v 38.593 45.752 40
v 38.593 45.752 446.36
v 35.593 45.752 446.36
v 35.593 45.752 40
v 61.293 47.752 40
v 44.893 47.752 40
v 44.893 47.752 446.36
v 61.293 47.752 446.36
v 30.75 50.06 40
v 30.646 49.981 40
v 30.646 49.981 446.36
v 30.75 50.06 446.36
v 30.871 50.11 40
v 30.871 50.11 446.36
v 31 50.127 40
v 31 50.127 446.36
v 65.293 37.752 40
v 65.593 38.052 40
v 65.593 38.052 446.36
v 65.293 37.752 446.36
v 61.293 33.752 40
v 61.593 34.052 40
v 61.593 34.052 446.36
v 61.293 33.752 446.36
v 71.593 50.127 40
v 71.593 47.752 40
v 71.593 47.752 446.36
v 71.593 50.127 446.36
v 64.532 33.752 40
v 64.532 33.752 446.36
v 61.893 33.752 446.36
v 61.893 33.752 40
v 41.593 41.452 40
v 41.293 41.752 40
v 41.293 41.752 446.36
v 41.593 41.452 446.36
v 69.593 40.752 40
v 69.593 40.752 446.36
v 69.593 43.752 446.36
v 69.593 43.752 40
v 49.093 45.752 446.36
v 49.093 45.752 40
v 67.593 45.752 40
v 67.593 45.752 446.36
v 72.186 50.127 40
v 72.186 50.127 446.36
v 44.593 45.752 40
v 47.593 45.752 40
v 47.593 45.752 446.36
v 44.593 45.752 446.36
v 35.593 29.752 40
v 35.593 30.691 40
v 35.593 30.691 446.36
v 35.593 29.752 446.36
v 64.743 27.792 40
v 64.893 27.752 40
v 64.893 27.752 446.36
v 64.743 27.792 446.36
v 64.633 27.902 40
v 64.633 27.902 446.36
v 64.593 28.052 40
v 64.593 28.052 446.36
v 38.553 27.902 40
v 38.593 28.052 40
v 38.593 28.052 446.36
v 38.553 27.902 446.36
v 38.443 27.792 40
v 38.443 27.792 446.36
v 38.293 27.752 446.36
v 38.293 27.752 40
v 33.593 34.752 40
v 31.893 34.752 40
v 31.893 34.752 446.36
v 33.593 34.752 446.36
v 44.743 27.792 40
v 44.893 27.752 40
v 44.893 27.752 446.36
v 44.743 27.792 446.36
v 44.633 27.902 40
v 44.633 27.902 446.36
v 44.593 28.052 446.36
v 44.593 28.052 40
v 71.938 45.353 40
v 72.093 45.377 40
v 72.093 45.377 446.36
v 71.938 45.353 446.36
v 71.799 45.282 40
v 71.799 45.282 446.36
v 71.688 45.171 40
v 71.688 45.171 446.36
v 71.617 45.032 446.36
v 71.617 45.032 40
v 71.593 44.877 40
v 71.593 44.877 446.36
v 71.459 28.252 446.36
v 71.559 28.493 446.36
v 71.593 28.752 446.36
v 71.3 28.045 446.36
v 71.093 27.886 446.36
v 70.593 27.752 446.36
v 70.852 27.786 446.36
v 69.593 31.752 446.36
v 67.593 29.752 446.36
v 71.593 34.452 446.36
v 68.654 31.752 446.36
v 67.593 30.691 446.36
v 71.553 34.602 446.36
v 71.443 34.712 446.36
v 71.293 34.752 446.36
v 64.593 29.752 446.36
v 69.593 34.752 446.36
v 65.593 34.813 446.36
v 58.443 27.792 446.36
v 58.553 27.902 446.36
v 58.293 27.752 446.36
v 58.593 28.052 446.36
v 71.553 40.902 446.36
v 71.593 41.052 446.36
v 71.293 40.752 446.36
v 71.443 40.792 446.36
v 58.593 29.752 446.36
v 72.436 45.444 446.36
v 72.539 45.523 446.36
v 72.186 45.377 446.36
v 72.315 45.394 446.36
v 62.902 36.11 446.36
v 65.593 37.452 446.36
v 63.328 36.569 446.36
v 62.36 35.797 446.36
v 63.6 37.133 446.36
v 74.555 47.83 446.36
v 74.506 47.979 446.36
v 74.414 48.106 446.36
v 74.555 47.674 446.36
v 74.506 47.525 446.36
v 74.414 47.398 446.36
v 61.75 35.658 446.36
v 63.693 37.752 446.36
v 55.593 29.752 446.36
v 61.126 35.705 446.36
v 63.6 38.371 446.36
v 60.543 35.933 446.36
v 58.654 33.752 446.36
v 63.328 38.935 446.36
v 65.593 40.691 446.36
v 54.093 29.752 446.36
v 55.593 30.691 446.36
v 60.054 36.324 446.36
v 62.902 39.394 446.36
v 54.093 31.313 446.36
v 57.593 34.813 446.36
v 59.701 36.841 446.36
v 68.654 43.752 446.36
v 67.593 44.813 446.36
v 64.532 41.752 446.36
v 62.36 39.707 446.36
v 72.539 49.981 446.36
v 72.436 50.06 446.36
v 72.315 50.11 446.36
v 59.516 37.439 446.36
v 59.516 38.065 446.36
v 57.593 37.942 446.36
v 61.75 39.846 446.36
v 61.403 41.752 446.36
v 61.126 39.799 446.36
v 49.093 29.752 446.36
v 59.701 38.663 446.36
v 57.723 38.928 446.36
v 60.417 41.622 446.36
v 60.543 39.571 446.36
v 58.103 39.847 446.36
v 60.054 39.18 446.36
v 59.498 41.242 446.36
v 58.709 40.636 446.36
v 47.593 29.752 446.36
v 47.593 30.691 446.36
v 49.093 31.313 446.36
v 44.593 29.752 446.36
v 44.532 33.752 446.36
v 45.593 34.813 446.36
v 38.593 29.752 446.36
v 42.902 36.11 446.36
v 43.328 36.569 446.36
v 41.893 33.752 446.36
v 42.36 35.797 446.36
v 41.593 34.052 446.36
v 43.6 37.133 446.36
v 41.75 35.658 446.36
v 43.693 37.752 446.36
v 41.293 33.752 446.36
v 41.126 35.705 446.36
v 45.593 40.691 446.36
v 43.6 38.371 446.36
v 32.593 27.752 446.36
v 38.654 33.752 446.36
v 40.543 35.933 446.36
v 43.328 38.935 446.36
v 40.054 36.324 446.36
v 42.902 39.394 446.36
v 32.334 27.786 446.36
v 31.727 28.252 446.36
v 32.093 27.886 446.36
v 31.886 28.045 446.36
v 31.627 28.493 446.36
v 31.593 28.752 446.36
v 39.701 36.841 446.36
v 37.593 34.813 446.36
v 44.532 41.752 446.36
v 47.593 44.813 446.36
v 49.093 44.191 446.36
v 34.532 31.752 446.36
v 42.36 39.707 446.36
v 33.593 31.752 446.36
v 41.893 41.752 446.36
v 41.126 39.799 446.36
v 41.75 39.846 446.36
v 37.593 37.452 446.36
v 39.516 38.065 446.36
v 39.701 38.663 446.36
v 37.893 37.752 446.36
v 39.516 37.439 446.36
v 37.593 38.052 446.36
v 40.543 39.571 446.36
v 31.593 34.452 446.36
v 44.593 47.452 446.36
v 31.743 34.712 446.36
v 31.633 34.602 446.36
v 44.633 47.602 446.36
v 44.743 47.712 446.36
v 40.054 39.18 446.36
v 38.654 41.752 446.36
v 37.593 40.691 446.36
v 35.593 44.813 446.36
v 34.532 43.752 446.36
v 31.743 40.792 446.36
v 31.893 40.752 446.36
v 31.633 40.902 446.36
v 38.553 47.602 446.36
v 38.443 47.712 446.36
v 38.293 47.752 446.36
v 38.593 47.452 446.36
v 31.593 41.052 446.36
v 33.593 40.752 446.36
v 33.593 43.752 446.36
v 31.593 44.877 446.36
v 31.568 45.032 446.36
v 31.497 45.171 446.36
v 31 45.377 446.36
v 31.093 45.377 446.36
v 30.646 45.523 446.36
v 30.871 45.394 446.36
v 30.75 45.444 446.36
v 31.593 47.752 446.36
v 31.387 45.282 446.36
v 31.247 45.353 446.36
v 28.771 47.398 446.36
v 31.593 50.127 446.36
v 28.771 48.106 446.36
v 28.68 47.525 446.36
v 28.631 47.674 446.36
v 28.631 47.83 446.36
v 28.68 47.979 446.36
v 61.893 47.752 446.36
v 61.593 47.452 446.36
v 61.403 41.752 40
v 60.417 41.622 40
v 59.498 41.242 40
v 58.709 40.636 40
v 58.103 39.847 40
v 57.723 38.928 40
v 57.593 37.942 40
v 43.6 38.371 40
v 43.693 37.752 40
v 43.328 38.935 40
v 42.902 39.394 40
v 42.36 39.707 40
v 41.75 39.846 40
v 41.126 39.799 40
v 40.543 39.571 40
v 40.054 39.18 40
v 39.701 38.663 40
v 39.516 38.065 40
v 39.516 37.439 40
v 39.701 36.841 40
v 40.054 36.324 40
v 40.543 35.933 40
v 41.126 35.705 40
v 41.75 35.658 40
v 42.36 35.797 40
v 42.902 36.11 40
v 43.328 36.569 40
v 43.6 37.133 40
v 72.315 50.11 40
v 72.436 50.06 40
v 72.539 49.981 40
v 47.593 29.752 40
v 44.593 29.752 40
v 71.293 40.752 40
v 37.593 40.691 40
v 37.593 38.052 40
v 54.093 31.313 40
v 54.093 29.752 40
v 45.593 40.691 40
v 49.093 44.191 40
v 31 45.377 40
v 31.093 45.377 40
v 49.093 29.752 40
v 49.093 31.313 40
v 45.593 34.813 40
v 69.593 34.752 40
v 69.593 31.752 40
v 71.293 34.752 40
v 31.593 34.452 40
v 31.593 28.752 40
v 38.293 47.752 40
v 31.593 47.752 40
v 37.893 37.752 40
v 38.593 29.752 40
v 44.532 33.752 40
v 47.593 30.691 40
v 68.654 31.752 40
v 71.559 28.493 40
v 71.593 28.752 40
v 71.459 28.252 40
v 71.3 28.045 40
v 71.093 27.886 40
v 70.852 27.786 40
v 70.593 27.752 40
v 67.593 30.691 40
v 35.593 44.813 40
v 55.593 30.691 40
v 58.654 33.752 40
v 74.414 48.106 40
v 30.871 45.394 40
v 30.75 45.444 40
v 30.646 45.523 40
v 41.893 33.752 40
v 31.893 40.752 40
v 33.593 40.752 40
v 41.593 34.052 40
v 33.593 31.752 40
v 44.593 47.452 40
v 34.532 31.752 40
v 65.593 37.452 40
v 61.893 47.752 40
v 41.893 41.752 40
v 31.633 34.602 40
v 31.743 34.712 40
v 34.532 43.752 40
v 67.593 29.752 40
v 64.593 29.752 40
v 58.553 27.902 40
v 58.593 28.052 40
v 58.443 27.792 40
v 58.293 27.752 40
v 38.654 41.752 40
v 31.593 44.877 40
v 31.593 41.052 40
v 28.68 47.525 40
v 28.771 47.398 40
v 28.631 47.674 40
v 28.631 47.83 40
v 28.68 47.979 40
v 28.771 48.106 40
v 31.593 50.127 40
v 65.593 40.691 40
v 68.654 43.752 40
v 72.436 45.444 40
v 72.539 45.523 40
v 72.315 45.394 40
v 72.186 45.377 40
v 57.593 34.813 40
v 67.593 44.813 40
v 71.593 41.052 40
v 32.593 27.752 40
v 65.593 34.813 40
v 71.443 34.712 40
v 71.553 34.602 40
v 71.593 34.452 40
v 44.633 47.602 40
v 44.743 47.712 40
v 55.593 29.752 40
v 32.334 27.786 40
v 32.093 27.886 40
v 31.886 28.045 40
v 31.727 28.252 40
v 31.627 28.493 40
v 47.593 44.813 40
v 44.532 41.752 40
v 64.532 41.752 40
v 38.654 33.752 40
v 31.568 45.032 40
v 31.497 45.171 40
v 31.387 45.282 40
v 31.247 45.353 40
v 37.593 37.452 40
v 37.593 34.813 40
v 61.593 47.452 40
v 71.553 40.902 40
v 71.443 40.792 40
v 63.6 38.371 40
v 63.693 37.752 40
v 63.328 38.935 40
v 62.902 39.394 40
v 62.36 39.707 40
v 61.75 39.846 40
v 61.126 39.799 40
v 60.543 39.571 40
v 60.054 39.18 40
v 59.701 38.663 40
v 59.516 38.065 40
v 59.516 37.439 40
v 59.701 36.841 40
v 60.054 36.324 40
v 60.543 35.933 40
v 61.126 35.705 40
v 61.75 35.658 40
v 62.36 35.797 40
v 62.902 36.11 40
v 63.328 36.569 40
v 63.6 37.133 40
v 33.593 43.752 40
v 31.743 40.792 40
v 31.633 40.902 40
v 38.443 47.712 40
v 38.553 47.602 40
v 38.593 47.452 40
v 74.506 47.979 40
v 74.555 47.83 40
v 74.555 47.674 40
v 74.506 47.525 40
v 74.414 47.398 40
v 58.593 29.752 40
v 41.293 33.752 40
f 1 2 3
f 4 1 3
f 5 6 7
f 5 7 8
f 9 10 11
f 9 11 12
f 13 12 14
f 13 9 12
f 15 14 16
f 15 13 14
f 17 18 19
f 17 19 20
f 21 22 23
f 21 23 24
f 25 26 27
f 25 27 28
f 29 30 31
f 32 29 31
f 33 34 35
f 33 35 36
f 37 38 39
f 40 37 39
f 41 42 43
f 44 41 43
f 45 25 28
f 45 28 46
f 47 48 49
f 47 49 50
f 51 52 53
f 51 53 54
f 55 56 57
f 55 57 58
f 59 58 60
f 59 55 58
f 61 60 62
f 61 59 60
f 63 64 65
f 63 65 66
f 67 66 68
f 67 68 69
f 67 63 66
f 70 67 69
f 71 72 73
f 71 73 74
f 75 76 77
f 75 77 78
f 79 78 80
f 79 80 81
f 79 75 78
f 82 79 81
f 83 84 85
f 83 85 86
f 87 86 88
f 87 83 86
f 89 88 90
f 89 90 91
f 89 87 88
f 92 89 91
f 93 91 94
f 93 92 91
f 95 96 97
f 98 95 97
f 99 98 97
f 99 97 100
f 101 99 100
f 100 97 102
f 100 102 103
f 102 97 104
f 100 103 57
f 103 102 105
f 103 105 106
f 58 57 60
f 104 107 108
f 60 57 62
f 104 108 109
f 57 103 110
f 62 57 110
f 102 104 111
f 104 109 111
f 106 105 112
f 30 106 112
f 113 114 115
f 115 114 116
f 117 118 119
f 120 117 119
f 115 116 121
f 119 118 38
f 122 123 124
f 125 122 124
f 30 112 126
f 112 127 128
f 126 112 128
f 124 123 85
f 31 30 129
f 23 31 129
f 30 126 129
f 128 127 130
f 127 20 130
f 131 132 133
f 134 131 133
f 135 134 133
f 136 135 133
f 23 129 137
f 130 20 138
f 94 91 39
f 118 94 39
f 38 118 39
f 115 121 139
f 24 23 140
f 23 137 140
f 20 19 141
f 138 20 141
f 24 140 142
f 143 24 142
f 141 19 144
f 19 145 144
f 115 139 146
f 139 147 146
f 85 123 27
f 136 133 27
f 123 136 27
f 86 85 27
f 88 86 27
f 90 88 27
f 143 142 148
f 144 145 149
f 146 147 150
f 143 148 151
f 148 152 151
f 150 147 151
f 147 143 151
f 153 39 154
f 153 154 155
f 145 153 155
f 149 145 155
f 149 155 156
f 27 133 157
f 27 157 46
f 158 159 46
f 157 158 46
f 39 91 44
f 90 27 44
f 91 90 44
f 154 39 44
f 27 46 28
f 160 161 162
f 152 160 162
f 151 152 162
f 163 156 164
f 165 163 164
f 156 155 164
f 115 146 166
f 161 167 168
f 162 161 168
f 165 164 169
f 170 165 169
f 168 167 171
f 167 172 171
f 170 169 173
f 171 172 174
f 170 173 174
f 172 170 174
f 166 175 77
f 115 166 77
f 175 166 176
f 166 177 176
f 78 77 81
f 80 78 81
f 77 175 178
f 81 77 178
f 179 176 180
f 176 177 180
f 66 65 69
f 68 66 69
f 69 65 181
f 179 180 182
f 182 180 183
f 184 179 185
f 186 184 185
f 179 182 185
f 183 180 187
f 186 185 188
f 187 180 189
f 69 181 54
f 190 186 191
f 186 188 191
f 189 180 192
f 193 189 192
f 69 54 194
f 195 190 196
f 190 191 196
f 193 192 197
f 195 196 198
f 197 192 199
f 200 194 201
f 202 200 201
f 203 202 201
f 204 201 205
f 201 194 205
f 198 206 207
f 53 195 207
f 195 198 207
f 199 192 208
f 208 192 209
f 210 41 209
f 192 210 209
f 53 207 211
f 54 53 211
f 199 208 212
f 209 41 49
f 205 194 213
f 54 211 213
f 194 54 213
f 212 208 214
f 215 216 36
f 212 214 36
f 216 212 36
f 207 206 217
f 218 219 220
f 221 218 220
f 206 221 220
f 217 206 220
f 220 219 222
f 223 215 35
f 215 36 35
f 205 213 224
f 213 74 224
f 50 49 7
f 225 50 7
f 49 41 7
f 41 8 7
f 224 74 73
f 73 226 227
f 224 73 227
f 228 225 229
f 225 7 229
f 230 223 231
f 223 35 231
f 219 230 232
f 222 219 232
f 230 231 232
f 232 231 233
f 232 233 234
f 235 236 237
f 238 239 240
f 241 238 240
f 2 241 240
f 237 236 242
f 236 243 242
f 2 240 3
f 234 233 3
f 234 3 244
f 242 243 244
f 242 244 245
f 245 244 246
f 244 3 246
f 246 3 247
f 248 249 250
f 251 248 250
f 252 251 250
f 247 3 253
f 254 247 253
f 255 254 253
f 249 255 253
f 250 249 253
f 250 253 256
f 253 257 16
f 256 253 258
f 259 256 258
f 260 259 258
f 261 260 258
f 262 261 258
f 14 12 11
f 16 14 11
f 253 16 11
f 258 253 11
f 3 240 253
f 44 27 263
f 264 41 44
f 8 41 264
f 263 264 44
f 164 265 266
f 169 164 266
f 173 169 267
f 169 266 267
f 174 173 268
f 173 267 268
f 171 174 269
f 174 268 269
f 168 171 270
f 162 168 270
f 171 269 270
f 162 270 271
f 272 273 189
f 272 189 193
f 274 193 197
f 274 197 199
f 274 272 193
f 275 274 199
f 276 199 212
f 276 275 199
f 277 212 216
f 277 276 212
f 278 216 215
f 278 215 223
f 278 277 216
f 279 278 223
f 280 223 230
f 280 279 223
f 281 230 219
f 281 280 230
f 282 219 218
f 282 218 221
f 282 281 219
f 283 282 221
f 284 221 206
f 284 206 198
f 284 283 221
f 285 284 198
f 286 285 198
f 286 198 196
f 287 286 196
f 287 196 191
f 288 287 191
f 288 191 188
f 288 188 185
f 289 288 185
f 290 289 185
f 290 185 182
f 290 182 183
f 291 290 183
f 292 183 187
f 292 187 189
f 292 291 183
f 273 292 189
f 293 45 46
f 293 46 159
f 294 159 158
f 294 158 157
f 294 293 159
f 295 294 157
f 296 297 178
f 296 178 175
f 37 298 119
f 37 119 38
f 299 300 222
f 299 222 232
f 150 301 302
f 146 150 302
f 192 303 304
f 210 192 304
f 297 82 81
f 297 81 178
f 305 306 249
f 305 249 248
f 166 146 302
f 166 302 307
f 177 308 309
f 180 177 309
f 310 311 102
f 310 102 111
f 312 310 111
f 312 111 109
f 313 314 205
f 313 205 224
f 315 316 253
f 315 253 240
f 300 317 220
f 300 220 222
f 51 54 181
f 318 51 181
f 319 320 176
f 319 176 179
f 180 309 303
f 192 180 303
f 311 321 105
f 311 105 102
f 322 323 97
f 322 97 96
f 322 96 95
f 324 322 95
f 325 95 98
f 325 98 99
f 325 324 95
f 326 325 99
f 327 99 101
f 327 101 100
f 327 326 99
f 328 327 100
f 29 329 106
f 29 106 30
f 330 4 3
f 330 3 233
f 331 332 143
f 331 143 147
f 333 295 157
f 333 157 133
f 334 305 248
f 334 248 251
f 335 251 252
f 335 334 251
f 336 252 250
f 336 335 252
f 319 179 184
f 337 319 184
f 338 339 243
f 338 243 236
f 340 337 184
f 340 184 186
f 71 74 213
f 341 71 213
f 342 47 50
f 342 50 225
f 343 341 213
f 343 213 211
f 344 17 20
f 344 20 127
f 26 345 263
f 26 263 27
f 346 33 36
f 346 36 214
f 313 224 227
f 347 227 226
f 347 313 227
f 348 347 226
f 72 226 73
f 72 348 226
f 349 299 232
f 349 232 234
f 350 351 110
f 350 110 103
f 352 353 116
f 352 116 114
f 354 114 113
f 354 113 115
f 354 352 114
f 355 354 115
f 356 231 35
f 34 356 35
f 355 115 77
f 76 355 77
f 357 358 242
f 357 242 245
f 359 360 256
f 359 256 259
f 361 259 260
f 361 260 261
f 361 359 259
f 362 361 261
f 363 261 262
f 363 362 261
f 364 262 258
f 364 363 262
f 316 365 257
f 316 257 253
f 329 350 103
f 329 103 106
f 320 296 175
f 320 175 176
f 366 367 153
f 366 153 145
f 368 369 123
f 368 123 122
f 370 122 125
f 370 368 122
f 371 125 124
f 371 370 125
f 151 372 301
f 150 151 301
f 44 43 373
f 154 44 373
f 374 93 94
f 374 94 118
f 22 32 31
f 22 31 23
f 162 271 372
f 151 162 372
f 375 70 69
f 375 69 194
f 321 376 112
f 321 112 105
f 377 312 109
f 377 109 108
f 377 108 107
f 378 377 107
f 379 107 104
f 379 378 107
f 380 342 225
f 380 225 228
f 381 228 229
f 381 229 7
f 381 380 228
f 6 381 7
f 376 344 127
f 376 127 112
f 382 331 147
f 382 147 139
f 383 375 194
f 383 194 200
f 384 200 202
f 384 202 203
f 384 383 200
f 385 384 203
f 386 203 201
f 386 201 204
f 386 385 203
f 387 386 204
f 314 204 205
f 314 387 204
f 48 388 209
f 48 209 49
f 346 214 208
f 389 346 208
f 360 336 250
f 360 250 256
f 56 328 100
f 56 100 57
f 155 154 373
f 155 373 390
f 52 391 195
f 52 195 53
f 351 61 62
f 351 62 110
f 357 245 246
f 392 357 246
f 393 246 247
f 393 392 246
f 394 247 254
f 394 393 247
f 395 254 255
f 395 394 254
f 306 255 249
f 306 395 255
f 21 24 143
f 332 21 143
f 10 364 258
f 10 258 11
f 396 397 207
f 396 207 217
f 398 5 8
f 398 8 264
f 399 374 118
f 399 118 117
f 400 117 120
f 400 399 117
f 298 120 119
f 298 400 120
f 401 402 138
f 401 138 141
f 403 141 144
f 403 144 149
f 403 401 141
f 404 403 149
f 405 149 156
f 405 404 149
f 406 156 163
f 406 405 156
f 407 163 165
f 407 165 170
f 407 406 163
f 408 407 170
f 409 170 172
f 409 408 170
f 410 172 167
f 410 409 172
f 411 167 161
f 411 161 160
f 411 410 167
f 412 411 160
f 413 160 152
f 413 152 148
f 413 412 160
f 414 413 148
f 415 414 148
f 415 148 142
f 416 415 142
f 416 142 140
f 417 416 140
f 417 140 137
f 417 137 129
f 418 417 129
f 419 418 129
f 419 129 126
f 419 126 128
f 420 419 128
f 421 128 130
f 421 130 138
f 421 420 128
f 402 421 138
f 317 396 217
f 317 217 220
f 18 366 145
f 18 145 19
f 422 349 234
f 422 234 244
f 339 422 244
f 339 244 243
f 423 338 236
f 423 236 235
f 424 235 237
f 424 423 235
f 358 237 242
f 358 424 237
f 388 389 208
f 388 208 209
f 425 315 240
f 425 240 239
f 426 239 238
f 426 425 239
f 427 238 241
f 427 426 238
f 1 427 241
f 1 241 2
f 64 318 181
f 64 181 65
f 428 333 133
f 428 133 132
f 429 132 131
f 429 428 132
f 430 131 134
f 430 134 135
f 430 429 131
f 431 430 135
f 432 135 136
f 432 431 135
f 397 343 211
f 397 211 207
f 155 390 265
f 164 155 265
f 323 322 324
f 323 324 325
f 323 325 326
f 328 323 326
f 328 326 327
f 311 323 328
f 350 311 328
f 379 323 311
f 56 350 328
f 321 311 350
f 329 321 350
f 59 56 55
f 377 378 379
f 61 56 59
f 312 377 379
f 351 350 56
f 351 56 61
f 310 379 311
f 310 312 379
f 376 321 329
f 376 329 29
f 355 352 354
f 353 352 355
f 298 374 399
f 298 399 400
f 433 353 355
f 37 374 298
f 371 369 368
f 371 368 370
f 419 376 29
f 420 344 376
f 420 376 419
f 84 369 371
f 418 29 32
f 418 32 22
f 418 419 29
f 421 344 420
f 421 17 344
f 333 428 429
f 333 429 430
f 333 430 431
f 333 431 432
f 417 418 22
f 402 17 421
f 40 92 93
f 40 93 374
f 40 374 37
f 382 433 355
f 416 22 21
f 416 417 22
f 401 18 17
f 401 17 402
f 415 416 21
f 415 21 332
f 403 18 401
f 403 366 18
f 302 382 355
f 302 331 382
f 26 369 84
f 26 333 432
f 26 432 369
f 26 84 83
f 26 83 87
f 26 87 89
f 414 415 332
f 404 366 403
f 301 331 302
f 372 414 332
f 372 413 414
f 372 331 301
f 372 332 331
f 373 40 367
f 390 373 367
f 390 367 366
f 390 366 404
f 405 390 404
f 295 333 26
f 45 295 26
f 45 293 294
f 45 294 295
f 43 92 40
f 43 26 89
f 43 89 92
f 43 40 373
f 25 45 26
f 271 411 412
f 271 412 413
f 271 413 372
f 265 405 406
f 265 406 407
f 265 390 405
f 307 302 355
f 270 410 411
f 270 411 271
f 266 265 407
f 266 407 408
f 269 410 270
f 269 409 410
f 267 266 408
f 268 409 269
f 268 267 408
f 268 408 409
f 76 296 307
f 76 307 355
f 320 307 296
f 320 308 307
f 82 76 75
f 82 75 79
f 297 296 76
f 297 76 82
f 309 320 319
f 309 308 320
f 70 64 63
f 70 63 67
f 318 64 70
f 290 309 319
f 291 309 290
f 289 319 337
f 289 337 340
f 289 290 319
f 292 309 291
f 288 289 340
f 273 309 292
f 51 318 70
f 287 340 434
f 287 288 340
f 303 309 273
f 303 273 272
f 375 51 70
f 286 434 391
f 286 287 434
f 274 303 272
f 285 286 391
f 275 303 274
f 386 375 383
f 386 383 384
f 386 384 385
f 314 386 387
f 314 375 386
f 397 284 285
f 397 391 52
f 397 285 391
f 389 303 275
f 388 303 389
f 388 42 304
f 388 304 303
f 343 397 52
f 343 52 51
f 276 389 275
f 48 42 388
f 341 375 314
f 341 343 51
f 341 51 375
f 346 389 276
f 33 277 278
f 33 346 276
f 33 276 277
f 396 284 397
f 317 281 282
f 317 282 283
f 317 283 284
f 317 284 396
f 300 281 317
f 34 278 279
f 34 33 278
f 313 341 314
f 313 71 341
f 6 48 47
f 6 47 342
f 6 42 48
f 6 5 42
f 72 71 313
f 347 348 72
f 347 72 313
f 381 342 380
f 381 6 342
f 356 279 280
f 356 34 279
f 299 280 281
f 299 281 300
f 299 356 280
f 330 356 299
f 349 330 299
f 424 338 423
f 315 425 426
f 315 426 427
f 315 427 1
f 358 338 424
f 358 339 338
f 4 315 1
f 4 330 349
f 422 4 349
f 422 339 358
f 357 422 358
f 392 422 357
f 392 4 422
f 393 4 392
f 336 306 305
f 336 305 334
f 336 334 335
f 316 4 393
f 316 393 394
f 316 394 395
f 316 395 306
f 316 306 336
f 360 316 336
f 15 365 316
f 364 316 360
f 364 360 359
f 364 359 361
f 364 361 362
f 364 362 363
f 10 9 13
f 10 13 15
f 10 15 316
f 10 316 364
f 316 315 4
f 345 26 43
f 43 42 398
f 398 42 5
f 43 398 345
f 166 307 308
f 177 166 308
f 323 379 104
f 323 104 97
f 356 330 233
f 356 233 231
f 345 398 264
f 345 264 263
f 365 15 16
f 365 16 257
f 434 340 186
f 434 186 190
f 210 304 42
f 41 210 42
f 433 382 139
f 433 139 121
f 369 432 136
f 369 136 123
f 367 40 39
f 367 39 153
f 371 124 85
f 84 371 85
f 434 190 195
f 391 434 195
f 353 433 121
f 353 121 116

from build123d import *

# Parameters (mm, degrees)
BOSS_EXTRUDE1_START = 40
MODEL_R             = 2.100000001
BOSS_EXTRUDE1_DEPTH = 406.36


with BuildPart() as part:
    # Model → Boss-Extrude1 (new body)
    with BuildSketch(Plane.XY.offset(BOSS_EXTRUDE1_START)):
        with BuildLine():
            Line((28.771485975, 48.105572105), (30.646485975, 49.980572105))
            ThreePointArc((30.646485975, 49.980572105), (30.808697649, 50.08895848), (31.000039365, 50.127018713))
            Line((31.000039365, 50.127018713), (31.592932584, 50.127018713))
            Line((31.592932584, 50.127018713), (31.592932584, 47.752018713))
            Line((31.592932584, 47.752018713), (38.292932585, 47.752018713))
            ThreePointArc((38.292932585, 47.752018713), (38.505064619, 47.664150748), (38.592932584, 47.452018714))
            Line((38.592932584, 47.452018714), (38.592932584, 45.752018713))
            Line((38.592932584, 45.752018713), (35.592932585, 45.752018713))
            Line((35.592932585, 45.752018713), (35.592932585, 44.812678885))
            Line((35.592932585, 44.812678885), (38.653592756, 41.752018713))
            Line((38.653592756, 41.752018713), (41.292932583, 41.752018713))
            Line((41.292932583, 41.752018713), (41.592932584, 41.452018713))
            Line((41.592932584, 41.452018713), (41.892932586, 41.752018714))
            Line((41.892932586, 41.752018714), (44.532272412, 41.752018714))
            Line((44.532272412, 41.752018714), (47.592932584, 44.812678886))
            Line((47.592932584, 44.812678886), (47.592932584, 45.752018714))
            Line((47.592932584, 45.752018714), (44.592932584, 45.752018714))
            Line((44.592932584, 45.752018714), (44.592932584, 47.452018715))
            ThreePointArc((44.592932584, 47.452018715), (44.68080055, 47.664150749), (44.892932584, 47.752018715))
            Line((44.892932584, 47.752018715), (61.292932583, 47.752018715))
            Line((61.292932583, 47.752018715), (61.592932582, 47.452018715))
            Line((61.592932582, 47.452018715), (61.892932583, 47.752018716))
            Line((61.892932583, 47.752018716), (71.592932583, 47.752018716))
            Line((71.592932583, 47.752018716), (71.592932583, 50.127018711))
            Line((71.592932583, 50.127018711), (72.185825802, 50.127018711))
            ThreePointArc((72.185825802, 50.127018711), (72.377167518, 50.088958477), (72.539379192, 49.980572102))
            Line((72.539379192, 49.980572102), (74.414379192, 48.105572102))
            ThreePointArc((74.414379192, 48.105572102), (74.560825801, 47.752018712), (74.414379192, 47.398465322))
            Line((74.414379192, 47.398465322), (72.539379192, 45.523465322))
            ThreePointArc((72.539379192, 45.523465322), (72.377167518, 45.415078947), (72.185825802, 45.377018714))
            Line((72.185825802, 45.377018714), (72.092932582, 45.377018714))
            ThreePointArc((72.092932582, 45.377018714), (71.739379192, 45.230572103), (71.592932583, 44.877018713))
            Line((71.592932583, 44.877018713), (71.592932583, 41.052018712))
            ThreePointArc((71.592932583, 41.052018712), (71.505064617, 40.839886678), (71.292932581, 40.752018713))
            Line((71.292932581, 40.752018713), (69.592932583, 40.752018713))
            Line((69.592932583, 40.752018713), (69.592932583, 43.752018712))
            Line((69.592932583, 43.752018712), (68.653592755, 43.752018712))
            Line((68.653592755, 43.752018712), (65.592932583, 40.691358541))
            Line((65.592932583, 40.691358541), (65.592932583, 38.052018712))
            Line((65.592932583, 38.052018712), (65.292932584, 37.752018712))
            Line((65.292932584, 37.752018712), (65.592932583, 37.452018713))
            Line((65.592932583, 37.452018713), (65.592932583, 34.812678884))
            Line((65.592932583, 34.812678884), (68.653592755, 31.752018712))
            Line((68.653592755, 31.752018712), (69.592932583, 31.752018712))
            Line((69.592932583, 31.752018712), (69.592932583, 34.752018711))
            Line((69.592932583, 34.752018711), (71.292932581, 34.752018711))
            ThreePointArc((71.292932581, 34.752018711), (71.505064617, 34.664150747), (71.592932583, 34.452018712))
            Line((71.592932583, 34.452018712), (71.592932583, 28.75201871))
            ThreePointArc((71.592932583, 28.75201871), (71.300039364, 28.044911929), (70.592932582, 27.752018711))
            Line((70.592932582, 27.752018711), (64.892932582, 27.752018711))
            ThreePointArc((64.892932582, 27.752018711), (64.680800548, 27.839886676), (64.592932583, 28.05201871))
            Line((64.592932583, 28.05201871), (64.592932583, 29.752018711))
            Line((64.592932583, 29.752018711), (67.592932582, 29.752018711))
            Line((67.592932582, 29.752018711), (67.592932582, 30.69135854))
            Line((67.592932582, 30.69135854), (64.532272411, 33.752018711))
            Line((64.532272411, 33.752018711), (61.892932584, 33.752018711))
            Line((61.892932584, 33.752018711), (61.592932582, 34.052018713))
            Line((61.592932582, 34.052018713), (61.292932582, 33.752018712))
            Line((61.292932582, 33.752018712), (58.653592755, 33.752018712))
            Line((58.653592755, 33.752018712), (55.592932583, 30.691358541))
            Line((55.592932583, 30.691358541), (55.592932583, 29.752018713))
            Line((55.592932583, 29.752018713), (58.592932583, 29.752018713))
            Line((58.592932583, 29.752018713), (58.592932583, 28.052018712))
            ThreePointArc((58.592932583, 28.052018712), (58.505064617, 27.839886678), (58.292932583, 27.752018712))
            Line((58.292932583, 27.752018712), (44.892932584, 27.752018712))
            ThreePointArc((44.892932584, 27.752018712), (44.68080055, 27.839886678), (44.592932584, 28.052018712))
            Line((44.592932584, 28.052018712), (44.592932584, 29.752018713))
            Line((44.592932584, 29.752018713), (47.592932584, 29.752018713))
            Line((47.592932584, 29.752018713), (47.592932584, 30.691358541))
            Line((47.592932584, 30.691358541), (44.532272412, 33.752018712))
            Line((44.532272412, 33.752018712), (41.892932586, 33.752018712))
            Line((41.892932586, 33.752018712), (41.592932584, 34.052018714))
            Line((41.592932584, 34.052018714), (41.292932583, 33.752018714))
            Line((41.292932583, 33.752018714), (38.653592756, 33.752018714))
            Line((38.653592756, 33.752018714), (35.592932585, 30.691358542))
            Line((35.592932585, 30.691358542), (35.592932585, 29.752018714))
            Line((35.592932585, 29.752018714), (38.592932584, 29.752018714))
            Line((38.592932584, 29.752018714), (38.592932584, 28.052018713))
            ThreePointArc((38.592932584, 28.052018713), (38.505064619, 27.839886679), (38.292932585, 27.752018714))
            Line((38.292932585, 27.752018714), (32.592932585, 27.752018714))
            ThreePointArc((32.592932585, 27.752018714), (31.885825803, 28.044911931), (31.592932584, 28.752018713))
            Line((31.592932584, 28.752018713), (31.592932584, 34.452018715))
            ThreePointArc((31.592932584, 34.452018715), (31.68080055, 34.664150748), (31.892932583, 34.752018714))
            Line((31.892932583, 34.752018714), (33.592932584, 34.752018714))
            Line((33.592932584, 34.752018714), (33.592932584, 31.752018715))
            Line((33.592932584, 31.752018715), (34.532272412, 31.752018715))
            Line((34.532272412, 31.752018715), (37.592932584, 34.812678886))
            Line((37.592932584, 34.812678886), (37.592932584, 37.452018715))
            Line((37.592932584, 37.452018715), (37.892932583, 37.752018715))
            Line((37.892932583, 37.752018715), (37.592932584, 38.052018714))
            Line((37.592932584, 38.052018714), (37.592932584, 40.691358543))
            Line((37.592932584, 40.691358543), (34.532272412, 43.752018715))
            Line((34.532272412, 43.752018715), (33.592932584, 43.752018715))
            Line((33.592932584, 43.752018715), (33.592932584, 40.752018716))
            Line((33.592932584, 40.752018716), (31.892932586, 40.752018716))
            ThreePointArc((31.892932586, 40.752018716), (31.68080055, 40.83988668), (31.592932584, 41.052018715))
            Line((31.592932584, 41.052018715), (31.592932584, 44.877018715))
            ThreePointArc((31.592932584, 44.877018715), (31.446485975, 45.230572106), (31.092932585, 45.377018716))
            Line((31.092932585, 45.377018716), (31.000039365, 45.377018716))
            ThreePointArc((31.000039365, 45.377018716), (30.808697649, 45.41507895), (30.646485975, 45.523465324))
            Line((30.646485975, 45.523465324), (28.771485975, 47.398465325))
            ThreePointArc((28.771485975, 47.398465325), (28.625039366, 47.752018715), (28.771485975, 48.105572105))
        make_face()
        with Locations((61.592932582, 37.752018715)):
            Circle(MODEL_R, mode=Mode.SUBTRACT)
        with Locations((41.592932582, 37.752018715)):
            Circle(MODEL_R, mode=Mode.SUBTRACT)
        with BuildLine():
            Line((54.092932584, 29.752018715), (49.092932584, 29.752018715))
            Line((49.092932584, 29.752018715), (49.092932584, 31.312678886))
            Line((49.092932584, 31.312678886), (45.592932583, 34.812678886))
            Line((45.592932583, 34.812678886), (45.592932583, 40.691358543))
            Line((45.592932583, 40.691358543), (49.092932584, 44.191358544))
            Line((49.092932584, 44.191358544), (49.092932584, 45.752018714))
            Line((49.092932584, 45.752018714), (67.592932582, 45.752018714))
            Line((67.592932582, 45.752018714), (67.592932582, 44.812678887))
            Line((67.592932582, 44.812678887), (64.532272411, 41.752018716))
            Line((64.532272411, 41.752018716), (61.402932584, 41.752018716))
            ThreePointArc((61.402932584, 41.752018716), (58.708855747, 40.636095552), (57.592932584, 37.942018716))
            Line((57.592932584, 37.942018716), (57.592932584, 34.812678886))
            Line((57.592932584, 34.812678886), (54.092932584, 31.312678886))
            Line((54.092932584, 31.312678886), (54.092932584, 29.752018715))
        make_face(mode=Mode.SUBTRACT)
    extrude(amount=BOSS_EXTRUDE1_DEPTH)


solid = part.part
